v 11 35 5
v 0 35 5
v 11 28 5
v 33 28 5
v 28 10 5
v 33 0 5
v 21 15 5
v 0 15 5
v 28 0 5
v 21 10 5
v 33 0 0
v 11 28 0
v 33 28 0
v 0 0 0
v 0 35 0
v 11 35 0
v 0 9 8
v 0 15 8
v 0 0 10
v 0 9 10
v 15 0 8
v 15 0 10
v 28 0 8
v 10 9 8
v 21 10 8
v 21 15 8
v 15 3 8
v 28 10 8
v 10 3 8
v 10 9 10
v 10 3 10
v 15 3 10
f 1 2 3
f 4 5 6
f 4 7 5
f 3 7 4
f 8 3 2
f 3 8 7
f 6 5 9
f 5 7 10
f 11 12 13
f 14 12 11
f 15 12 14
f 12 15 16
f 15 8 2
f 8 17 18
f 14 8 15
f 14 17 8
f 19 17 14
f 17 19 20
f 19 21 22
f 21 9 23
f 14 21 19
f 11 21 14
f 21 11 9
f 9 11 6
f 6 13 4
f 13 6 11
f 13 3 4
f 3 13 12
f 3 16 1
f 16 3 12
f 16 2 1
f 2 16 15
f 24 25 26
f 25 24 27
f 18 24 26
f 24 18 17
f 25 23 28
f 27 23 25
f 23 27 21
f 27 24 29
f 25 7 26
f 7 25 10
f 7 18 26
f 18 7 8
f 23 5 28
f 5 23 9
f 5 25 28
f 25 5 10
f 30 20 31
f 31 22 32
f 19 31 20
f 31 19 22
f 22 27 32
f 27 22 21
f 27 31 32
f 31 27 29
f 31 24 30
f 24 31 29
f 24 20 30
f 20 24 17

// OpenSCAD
translate([5.5, 3.5, 2.5]) color([0.38801723531250565, 0.4144179882772473, 0.650832862263345]) cube([11, 7, 5], center=true);
translate([16.5, 3.5, 2.5]) color([0.001524221856720187, 0.1923095412446758, 0.3344016906625016]) cube([11, 7, 5], center=true);
translate([27.5, 3.5, 2.5]) color([0.23941596018595857, 0.6373994011293003, 0.37864807032309444]) cube([11, 7, 5], center=true);
translate([5.5, 10.5, 2.5]) color([0.8754233917130172, 0.5681514209101919, 0.4144063966836443]) cube([11, 7, 5], center=true);
translate([16.5, 10.5, 2.5]) color([0.40226707511907955, 0.7018296239336754, 0.41822655329246605]) cube([11, 7, 5], center=true);
translate([27.5, 10.5, 2.5]) color([0.6621958889738174, 0.04677968595679827, 0.44535218971882984]) cube([11, 7, 5], center=true);
translate([5.5, 17.5, 2.5]) color([0.25922692344722276, 0.15768657212231085, 0.5275731301676146]) cube([11, 7, 5], center=true);
translate([16.5, 17.5, 2.5]) color([0.48726560106903205, 0.5614049256144269, 0.7554847672586825]) cube([11, 7, 5], center=true);
translate([27.5, 17.5, 2.5]) color([0.8838751542487009, 0.4945826703752868, 0.31205824641687296]) cube([11, 7, 5], center=true);
translate([5.5, 24.5, 2.5]) color([0.46689223535252355, 0.8090458573603624, 0.8750163314802711]) cube([11, 7, 5], center=true);
translate([16.5, 24.5, 2.5]) color([0.8124149323637591, 0.188001294050828, 0.9994203594553304]) cube([11, 7, 5], center=true);
translate([27.5, 24.5, 2.5]) color([0.6330887599183004, 0.08346705017572931, 0.7255543554613124]) cube([11, 7, 5], center=true);
translate([5.5, 31.5, 2.5]) color([0.9868214802051282, 0.40181682221254356, 0.6785150052419683]) cube([11, 7, 5], center=true);
translate([3.5, 2.5, 6.5]) color([0.31617713722134233, 0.2135246620646961, 0.7173241433110372]) cube([7, 5, 3], center=true);
translate([10.5, 2.5, 6.5]) color([0.0023575647193538884, 0.8227314105314157, 0.5283459768597928]) cube([7, 5, 3], center=true);
translate([17.5, 2.5, 6.5]) color([0.09778434180065931, 0.11890389478474583, 0.6492654248961536]) cube([7, 5, 3], center=true);
translate([3.5, 7.5, 6.5]) color([0.8736538239003423, 0.27998274332687256, 0.9785151867733981]) cube([7, 5, 3], center=true);
translate([10.5, 7.5, 6.5]) color([0.10018068906370903, 0.8539381095973382, 0.39669617733090445]) cube([7, 5, 3], center=true);
translate([17.5, 7.5, 6.5]) color([0.08134541676823415, 0.2747138434192621, 0.4529781848179143]) cube([7, 5, 3], center=true);
translate([3.5, 12.5, 6.5]) color([0.7923415311856522, 0.8613599036372361, 0.13342055420254906]) cube([7, 5, 3], center=true);
translate([10.5, 12.5, 6.5]) color([0.5208655284141989, 0.6507832381497373, 0.3470530145996015]) cube([7, 5, 3], center=true);
translate([17.5, 12.5, 6.5]) color([0.8718638357105861, 0.27840981521636055, 0.01857432754559518]) cube([7, 5, 3], center=true);
translate([24.5, 2.5, 6.5]) color([0.0406632736752609, 0.6809967701112433, 0.5583557360970469]) cube([7, 5, 3], center=true);
translate([24.5, 7.5, 6.5]) color([0.946502554169996, 0.9384387997349186, 0.9098511774051025]) cube([7, 5, 3], center=true);
translate([2.5, 1.5, 9.0]) color([0.04200453196734122, 0.7491348233908631, 0.7013248175948597]) cube([5, 3, 2], center=true);
translate([7.5, 1.5, 9.0]) color([0.6553618646747296, 0.7123576525162417, 0.9027101506193307]) cube([5, 3, 2], center=true);
translate([12.5, 1.5, 9.0]) color([0.6401411997932241, 0.372449262972256, 0.5379287837318205]) cube([5, 3, 2], center=true);
translate([2.5, 4.5, 9.0]) color([0.20784410369082473, 0.5871255046951435, 0.008897082049078797]) cube([5, 3, 2], center=true);
translate([7.5, 4.5, 9.0]) color([0.15102317386398778, 0.3334083880298664, 0.7896231589257826]) cube([5, 3, 2], center=true);
translate([2.5, 7.5, 9.0]) color([0.7184994227715396, 0.3382559700266786, 0.6205381083165517]) cube([5, 3, 2], center=true);
translate([7.5, 7.5, 9.0]) color([0.041202949506209285, 0.16386054567557595, 0.9819140701253054]) cube([5, 3, 2], center=true);
